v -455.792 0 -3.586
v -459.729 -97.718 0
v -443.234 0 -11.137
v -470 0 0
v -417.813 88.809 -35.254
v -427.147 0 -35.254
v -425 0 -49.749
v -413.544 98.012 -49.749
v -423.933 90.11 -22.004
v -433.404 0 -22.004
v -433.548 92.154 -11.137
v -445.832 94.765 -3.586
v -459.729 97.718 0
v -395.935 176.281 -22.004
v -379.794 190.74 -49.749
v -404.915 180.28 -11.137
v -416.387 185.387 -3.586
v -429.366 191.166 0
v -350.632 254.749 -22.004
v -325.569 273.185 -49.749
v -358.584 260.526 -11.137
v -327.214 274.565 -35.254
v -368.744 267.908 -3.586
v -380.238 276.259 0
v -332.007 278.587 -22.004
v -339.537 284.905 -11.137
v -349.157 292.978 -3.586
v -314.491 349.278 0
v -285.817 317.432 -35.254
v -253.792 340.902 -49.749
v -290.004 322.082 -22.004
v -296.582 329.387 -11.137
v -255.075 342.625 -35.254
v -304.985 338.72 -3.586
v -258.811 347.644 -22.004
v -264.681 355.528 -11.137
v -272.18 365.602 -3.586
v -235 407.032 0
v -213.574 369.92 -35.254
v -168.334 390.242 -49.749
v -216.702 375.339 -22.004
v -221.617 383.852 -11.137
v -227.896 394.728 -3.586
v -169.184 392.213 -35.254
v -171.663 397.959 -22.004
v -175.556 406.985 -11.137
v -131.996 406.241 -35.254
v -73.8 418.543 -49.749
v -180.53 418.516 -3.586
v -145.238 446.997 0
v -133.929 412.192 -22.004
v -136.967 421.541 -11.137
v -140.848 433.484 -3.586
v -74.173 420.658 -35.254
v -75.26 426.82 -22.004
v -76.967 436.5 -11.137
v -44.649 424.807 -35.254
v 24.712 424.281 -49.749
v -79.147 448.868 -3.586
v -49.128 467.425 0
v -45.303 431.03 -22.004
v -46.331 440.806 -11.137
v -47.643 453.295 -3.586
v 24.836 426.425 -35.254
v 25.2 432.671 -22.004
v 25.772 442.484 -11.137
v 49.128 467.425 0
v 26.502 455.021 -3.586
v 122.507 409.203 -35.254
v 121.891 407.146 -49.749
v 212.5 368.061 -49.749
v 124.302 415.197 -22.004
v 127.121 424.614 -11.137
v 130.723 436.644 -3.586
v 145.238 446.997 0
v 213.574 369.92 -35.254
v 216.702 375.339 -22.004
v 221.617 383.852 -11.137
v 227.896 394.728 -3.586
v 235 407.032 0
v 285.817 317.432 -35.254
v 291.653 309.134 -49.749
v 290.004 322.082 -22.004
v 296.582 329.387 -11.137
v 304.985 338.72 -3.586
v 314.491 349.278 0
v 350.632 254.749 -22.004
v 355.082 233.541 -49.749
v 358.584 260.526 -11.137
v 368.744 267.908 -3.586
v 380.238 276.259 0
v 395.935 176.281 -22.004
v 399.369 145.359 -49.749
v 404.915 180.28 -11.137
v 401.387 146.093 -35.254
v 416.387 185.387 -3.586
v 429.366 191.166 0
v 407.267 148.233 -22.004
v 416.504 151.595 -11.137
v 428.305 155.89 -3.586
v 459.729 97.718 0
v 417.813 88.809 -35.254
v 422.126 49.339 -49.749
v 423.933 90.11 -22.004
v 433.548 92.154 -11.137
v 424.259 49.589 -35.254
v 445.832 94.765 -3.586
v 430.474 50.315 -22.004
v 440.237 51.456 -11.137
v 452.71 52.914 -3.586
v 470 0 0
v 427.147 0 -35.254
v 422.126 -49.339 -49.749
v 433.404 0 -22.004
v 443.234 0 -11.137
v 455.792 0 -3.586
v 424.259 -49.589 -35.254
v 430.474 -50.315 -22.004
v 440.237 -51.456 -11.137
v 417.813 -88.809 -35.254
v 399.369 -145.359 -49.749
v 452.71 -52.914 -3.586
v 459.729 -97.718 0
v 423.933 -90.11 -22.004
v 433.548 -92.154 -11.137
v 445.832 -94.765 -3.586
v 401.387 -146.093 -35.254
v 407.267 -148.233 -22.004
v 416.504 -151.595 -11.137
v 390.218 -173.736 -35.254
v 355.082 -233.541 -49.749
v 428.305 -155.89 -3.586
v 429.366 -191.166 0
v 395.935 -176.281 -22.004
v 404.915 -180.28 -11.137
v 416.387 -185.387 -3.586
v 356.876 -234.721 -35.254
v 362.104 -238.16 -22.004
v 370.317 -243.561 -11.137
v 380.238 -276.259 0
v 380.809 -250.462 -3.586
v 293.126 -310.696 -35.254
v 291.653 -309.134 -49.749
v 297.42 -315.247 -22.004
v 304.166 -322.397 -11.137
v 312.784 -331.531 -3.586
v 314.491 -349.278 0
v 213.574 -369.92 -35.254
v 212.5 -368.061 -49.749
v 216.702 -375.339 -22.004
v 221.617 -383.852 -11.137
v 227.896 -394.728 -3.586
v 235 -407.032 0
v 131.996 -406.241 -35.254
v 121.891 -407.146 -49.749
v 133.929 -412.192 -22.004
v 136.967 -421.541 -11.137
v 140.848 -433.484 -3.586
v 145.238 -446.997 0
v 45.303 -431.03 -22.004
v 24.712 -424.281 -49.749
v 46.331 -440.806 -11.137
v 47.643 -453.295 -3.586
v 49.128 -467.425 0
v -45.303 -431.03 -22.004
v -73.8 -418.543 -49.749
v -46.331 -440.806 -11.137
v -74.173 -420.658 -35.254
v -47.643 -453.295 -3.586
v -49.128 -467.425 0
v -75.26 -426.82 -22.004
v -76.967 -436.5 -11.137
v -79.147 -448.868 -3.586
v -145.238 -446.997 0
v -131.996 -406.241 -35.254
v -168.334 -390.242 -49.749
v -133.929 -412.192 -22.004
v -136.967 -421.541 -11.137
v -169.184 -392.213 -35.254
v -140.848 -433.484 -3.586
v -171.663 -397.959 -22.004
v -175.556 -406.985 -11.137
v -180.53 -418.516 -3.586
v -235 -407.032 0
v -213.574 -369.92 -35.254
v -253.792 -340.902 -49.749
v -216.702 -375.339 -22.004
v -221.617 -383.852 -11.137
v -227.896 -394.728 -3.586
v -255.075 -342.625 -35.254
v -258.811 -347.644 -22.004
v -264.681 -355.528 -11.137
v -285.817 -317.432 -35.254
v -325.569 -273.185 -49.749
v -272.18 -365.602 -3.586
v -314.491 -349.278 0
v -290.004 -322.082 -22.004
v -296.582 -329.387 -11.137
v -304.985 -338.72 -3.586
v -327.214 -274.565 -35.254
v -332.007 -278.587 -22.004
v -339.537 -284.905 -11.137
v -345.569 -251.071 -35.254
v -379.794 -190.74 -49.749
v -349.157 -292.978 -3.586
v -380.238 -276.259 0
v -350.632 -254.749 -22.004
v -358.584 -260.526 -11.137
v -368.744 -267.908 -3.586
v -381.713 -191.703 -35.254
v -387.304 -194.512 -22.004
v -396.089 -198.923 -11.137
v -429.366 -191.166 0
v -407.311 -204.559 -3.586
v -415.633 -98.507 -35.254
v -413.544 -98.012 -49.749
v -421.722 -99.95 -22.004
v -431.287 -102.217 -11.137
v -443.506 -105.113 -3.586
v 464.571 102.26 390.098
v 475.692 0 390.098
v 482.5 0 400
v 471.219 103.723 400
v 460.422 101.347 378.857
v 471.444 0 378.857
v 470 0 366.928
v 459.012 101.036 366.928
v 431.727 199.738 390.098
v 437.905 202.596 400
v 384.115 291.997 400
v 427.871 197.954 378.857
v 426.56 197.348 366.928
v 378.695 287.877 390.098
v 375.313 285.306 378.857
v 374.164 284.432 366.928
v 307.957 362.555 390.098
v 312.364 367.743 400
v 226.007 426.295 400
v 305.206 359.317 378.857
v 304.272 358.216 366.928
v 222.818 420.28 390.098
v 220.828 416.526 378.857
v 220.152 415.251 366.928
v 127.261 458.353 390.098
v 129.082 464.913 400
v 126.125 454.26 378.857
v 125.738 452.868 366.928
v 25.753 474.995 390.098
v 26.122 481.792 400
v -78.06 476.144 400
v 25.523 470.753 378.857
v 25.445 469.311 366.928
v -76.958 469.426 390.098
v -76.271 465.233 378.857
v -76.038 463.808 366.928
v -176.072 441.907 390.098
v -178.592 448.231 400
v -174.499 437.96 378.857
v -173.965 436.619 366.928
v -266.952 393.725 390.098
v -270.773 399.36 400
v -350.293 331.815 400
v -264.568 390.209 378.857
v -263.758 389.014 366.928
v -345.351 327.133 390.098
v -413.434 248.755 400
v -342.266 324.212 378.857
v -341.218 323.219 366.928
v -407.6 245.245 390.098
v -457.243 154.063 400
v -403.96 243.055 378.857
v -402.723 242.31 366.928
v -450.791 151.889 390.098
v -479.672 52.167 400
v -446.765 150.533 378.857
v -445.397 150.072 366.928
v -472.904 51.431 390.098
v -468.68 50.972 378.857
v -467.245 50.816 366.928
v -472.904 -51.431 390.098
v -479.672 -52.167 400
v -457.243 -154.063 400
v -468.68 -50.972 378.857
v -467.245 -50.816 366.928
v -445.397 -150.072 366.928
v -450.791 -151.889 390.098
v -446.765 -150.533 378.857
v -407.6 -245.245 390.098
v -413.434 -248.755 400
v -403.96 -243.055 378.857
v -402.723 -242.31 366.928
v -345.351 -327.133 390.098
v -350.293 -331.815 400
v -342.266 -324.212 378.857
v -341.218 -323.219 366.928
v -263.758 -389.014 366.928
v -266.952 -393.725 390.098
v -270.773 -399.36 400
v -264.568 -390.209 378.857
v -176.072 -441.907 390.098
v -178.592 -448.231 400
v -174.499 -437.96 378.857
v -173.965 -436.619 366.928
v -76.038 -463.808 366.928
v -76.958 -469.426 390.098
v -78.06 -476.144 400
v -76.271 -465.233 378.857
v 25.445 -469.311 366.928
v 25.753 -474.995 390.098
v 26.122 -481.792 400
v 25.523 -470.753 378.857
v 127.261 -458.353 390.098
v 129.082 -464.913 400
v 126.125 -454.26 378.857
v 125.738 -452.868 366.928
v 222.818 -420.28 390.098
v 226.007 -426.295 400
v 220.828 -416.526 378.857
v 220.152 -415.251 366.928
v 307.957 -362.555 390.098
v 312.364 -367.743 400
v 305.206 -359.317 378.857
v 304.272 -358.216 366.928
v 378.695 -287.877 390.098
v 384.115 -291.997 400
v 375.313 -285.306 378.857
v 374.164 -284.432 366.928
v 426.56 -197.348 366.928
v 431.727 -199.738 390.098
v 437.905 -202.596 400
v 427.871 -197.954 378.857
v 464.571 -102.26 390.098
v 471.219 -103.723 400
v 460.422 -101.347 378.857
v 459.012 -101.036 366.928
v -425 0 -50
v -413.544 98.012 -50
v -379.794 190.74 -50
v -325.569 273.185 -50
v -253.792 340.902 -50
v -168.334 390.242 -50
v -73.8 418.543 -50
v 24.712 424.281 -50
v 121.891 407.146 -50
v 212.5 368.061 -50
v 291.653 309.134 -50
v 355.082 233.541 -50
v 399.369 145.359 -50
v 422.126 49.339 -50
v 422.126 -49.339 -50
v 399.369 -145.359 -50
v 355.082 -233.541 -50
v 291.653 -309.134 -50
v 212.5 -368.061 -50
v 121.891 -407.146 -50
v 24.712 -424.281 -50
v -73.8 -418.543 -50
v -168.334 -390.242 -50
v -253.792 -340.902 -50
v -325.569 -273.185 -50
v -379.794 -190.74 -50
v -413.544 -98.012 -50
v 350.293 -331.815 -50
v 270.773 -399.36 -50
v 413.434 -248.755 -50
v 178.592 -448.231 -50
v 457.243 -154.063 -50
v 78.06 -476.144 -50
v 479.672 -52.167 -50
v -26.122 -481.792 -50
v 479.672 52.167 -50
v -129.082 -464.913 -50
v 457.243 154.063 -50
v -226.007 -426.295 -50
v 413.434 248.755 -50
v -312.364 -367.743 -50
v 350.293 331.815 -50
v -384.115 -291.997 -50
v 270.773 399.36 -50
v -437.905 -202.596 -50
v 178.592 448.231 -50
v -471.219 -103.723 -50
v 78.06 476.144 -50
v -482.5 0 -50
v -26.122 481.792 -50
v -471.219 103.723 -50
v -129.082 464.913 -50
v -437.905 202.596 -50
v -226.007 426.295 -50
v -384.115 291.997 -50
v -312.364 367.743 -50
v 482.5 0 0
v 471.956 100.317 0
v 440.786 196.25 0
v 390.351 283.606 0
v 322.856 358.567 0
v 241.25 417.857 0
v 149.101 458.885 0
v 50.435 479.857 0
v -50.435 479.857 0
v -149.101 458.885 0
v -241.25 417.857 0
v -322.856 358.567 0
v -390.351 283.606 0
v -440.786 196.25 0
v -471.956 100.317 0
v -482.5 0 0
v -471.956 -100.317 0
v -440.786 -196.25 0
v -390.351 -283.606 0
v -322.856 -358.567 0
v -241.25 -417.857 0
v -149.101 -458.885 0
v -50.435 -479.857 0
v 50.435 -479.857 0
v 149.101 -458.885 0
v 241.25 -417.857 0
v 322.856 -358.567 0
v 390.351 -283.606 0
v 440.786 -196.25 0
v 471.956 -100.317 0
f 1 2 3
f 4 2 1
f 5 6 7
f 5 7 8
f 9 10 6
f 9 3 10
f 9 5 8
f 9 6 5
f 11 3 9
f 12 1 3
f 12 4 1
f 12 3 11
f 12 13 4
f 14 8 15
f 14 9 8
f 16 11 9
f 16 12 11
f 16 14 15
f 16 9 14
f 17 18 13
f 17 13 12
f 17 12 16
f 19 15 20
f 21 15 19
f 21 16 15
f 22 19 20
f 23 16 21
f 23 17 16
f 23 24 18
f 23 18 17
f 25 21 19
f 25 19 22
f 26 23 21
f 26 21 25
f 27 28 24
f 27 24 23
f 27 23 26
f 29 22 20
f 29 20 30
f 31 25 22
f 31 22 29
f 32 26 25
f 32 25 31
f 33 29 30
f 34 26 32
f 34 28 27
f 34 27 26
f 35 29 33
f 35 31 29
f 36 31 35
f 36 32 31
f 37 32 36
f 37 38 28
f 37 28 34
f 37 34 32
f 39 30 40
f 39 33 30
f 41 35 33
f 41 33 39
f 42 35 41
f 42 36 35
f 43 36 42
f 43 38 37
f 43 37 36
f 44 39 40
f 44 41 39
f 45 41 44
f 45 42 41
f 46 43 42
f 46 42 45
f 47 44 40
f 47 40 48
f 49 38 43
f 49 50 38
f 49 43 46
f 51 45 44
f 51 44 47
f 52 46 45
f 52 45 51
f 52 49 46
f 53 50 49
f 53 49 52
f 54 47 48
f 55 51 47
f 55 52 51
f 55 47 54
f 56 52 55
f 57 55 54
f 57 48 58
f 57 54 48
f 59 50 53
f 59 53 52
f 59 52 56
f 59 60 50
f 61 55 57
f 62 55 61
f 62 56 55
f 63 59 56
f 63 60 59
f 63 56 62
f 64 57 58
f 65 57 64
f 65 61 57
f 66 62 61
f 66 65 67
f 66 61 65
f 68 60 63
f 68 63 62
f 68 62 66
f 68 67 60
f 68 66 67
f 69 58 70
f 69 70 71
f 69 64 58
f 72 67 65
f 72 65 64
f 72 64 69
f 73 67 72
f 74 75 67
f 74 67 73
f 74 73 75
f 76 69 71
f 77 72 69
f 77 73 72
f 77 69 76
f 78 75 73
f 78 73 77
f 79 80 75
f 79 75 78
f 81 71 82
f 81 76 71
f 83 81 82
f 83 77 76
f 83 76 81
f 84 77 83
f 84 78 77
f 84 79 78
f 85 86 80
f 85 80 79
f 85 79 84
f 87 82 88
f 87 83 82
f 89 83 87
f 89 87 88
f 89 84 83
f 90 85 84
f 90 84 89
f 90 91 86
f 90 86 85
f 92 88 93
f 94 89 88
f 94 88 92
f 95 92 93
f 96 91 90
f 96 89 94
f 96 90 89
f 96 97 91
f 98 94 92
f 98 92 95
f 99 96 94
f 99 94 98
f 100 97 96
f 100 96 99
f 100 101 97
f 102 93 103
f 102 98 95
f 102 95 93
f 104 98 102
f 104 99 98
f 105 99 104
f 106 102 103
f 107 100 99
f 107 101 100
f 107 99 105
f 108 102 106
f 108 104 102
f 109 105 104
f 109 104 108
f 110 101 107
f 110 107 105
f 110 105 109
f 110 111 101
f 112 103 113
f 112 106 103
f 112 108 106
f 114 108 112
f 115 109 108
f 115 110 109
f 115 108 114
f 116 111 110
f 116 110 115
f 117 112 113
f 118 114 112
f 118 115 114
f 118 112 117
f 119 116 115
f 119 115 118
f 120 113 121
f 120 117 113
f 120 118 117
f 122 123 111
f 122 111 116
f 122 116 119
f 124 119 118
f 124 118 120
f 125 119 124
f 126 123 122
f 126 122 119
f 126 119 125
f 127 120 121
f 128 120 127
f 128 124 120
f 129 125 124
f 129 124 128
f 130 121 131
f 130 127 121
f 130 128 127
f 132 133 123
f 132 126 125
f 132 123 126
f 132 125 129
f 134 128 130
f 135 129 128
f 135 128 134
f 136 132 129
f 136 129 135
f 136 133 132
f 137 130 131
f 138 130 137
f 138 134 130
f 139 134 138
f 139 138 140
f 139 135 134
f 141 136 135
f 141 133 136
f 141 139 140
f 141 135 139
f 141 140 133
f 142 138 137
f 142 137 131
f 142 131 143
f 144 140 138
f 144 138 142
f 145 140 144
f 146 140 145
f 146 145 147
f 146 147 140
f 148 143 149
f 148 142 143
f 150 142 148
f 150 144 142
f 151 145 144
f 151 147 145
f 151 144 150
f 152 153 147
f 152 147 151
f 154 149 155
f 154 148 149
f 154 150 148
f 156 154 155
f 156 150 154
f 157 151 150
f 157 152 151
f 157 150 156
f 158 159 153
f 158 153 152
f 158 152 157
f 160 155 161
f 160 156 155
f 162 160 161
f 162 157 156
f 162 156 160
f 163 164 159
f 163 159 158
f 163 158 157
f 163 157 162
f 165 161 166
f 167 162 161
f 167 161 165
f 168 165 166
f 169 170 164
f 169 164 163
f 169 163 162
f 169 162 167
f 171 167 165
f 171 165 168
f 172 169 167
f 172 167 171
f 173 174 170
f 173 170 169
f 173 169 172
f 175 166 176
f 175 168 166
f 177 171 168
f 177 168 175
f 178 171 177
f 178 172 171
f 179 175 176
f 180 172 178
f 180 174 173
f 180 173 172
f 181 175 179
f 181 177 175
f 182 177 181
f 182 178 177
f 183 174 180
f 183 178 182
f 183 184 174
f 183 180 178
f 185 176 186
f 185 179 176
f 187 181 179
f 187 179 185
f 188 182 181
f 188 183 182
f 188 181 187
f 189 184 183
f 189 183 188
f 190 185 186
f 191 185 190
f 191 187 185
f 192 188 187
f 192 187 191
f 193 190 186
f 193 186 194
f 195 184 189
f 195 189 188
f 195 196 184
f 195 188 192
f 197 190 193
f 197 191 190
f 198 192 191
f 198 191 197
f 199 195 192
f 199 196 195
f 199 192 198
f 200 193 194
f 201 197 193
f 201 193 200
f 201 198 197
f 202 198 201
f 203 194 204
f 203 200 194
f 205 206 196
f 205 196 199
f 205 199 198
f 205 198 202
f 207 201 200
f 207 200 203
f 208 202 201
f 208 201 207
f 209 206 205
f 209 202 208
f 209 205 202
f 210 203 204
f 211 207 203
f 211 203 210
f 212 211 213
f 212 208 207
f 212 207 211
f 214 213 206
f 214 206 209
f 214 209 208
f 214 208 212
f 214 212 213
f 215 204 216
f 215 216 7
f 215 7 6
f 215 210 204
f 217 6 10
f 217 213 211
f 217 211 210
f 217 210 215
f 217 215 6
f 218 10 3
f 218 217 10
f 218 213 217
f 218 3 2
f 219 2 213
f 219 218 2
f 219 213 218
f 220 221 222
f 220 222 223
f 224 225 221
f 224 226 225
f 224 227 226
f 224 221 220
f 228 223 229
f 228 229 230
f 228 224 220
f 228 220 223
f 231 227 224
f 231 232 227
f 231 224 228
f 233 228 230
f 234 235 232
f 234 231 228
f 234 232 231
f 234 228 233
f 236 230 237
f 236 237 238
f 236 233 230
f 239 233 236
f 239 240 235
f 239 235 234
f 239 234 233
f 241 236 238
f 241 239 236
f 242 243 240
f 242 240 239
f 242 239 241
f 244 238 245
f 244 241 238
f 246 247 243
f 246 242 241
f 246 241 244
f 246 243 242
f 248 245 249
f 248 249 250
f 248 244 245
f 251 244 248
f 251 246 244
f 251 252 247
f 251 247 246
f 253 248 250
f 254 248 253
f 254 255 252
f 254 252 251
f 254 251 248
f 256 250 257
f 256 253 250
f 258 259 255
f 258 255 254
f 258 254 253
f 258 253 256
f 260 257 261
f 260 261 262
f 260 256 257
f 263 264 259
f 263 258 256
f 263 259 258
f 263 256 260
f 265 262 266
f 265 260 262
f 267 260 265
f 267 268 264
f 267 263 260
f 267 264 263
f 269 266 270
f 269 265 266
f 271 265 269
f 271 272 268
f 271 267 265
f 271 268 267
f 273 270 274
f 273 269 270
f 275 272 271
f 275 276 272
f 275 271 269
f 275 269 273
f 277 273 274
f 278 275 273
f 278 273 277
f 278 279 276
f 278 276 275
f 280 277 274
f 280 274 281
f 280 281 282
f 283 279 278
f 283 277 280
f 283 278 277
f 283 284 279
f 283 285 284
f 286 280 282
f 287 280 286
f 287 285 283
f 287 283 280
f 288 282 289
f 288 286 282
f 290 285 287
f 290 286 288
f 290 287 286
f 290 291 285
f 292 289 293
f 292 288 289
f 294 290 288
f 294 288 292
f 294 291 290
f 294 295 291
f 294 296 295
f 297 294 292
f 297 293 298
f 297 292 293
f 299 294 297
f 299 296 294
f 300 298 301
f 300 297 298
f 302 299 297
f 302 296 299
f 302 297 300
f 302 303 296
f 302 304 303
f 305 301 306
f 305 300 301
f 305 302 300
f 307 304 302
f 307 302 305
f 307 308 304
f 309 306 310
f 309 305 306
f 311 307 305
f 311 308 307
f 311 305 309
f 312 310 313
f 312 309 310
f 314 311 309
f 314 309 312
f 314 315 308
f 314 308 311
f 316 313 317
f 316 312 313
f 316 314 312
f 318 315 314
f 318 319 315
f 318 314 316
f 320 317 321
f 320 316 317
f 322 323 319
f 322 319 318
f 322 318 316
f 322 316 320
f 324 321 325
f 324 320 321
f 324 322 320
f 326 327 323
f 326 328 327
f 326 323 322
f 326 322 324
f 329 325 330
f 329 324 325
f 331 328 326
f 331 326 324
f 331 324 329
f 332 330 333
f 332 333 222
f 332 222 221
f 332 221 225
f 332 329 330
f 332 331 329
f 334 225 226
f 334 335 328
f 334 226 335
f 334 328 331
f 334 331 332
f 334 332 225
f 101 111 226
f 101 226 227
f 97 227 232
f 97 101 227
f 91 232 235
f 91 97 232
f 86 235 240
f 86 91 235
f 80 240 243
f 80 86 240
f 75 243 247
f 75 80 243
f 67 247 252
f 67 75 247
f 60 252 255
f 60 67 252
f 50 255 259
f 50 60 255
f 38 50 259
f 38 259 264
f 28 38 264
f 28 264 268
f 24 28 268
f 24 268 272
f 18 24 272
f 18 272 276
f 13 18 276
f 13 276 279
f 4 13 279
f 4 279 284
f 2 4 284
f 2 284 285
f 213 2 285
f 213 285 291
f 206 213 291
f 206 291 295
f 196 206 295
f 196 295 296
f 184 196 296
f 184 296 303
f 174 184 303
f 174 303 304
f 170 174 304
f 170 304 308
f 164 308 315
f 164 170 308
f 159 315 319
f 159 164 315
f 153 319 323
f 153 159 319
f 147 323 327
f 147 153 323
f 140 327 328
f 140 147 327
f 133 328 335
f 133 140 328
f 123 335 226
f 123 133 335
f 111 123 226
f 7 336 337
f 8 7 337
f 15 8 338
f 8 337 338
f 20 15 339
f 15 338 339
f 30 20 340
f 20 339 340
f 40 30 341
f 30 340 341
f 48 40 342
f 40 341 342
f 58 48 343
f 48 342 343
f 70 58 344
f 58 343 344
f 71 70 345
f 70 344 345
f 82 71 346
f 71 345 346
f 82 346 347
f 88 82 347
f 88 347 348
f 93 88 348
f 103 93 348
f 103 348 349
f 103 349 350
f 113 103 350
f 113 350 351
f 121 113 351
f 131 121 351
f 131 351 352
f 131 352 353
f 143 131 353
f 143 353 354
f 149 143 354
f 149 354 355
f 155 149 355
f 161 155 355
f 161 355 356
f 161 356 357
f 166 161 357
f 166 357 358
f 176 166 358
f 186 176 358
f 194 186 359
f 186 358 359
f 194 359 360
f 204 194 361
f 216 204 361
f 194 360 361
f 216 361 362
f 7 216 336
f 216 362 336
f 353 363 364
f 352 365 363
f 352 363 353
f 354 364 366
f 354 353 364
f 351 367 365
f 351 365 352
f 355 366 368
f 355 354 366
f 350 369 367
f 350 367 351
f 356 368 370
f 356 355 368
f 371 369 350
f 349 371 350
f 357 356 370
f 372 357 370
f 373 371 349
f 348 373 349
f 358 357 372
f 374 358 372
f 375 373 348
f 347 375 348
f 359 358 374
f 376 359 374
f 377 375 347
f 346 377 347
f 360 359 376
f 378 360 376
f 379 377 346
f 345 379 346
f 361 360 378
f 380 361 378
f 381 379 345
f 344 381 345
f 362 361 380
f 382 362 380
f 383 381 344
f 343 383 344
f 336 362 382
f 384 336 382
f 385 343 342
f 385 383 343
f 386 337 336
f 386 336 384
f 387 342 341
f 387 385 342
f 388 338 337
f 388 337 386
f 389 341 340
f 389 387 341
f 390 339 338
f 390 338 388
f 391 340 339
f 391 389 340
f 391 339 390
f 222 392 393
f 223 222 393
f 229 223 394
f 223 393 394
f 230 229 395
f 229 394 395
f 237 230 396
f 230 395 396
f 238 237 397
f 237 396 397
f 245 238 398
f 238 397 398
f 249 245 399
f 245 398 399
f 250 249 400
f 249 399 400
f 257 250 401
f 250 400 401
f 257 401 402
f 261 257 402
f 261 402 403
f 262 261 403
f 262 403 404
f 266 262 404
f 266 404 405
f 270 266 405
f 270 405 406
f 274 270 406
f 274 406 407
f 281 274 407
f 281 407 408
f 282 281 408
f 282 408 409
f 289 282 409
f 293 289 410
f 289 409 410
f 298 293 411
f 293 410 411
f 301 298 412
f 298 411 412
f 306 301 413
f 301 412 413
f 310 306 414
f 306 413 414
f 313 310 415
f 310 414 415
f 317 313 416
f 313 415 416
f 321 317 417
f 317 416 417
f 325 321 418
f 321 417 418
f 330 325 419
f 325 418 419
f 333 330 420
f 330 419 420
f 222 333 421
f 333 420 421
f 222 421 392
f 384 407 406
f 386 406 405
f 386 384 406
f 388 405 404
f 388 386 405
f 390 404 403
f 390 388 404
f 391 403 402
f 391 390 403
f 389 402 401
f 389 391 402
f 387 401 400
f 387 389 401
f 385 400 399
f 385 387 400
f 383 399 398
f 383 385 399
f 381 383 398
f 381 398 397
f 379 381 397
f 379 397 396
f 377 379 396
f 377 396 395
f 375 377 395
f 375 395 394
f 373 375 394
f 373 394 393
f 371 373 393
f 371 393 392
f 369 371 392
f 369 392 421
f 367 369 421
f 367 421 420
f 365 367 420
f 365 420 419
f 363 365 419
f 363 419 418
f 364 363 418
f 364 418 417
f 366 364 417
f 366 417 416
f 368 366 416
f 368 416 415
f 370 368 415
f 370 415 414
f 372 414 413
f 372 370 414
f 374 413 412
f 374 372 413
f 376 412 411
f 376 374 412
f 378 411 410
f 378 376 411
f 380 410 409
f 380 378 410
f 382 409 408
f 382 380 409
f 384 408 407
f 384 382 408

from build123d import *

# Parameters (mm, degrees)
CROQUIS1_R              = 482.5
CROQUIS1_R_2            = 470
SALIENTE_EXTRUIR1_DEPTH = 400
REDONDEO1_R             = 50
SALIENTE_EXTRUIR2_START = 50
CROQUIS2_R              = 482.5
CROQUIS2_R_2            = 425
SALIENTE_EXTRUIR2_DEPTH = 50
REDONDEO3_R             = 50


with BuildPart() as part:
    # Croquis1 → Saliente-Extruir1 (new body)
    with BuildSketch(Plane(origin=(0, 0, 0), x_dir=(0, 1, 0), z_dir=(0, 0, 1))):
        with Locations(Location((0, 0, 0), (0, 0, 270))):
            Circle(CROQUIS1_R)
        with Locations(Location((0, 0, 0), (0, 0, 270))):
            Circle(CROQUIS1_R_2, mode=Mode.SUBTRACT)
    extrude(amount=SALIENTE_EXTRUIR1_DEPTH)

    # Redondeo1
    # the kernel refuses this fillet: 50 mm, written as the material it takes off along each edge
    with BuildSketch(Plane(origin=(0, 0, 400), x_dir=(1, 0, 0), z_dir=(0, -1, 0))) as redondeo1_piece_1:
        with BuildLine():
            CenterArc((520, -33.071891388), REDONDEO1_R, 138.590377891, 41.409622109)
            Line((482.5, 0), (481.75, 0.661437828))
            ThreePointArc((481.75, 0.661437828), (476.25, 1), (470, 1))
            Line((470, 1), (469, 0))
            Line((469, 0), (469, -33.071891388))
            Line((469, -33.071891388), (470, -33.071891388))
        make_face()
    revolve(axis=Axis((0, 0, 400), (0, 0, 1)), mode=Mode.SUBTRACT)

    # Croquis2 → Saliente-Extruir2 (add)
    with BuildSketch(Plane(origin=(0, 0, 0), x_dir=(1, 0, 0), z_dir=(0, 0, -1)).offset(SALIENTE_EXTRUIR2_START)):
        with Locations(Location((0, 0, 0), (0, 0, 180))):
            Circle(CROQUIS2_R)
        with Locations(Location((0, 0, 0), (0, 0, 180))):
            Circle(CROQUIS2_R_2, mode=Mode.SUBTRACT)
    extrude(amount=-SALIENTE_EXTRUIR2_DEPTH)

    # Redondeo3
    # the kernel refuses this fillet: 50 mm, written as the material it takes off along each edge
    with BuildSketch(Plane(origin=(0, 0, 0), x_dir=(-1, 0, 0), z_dir=(0, -1, 0))) as redondeo3_piece_1:
        with BuildLine():
            CenterArc((475, 49.749371855), REDONDEO3_R, 180, 84.260829523)
            Line((470, 0), (469.9, -0.994987437))
            ThreePointArc((469.9, -0.994987437), (447.5, -1), (425, -1))
            Line((425, -1), (424, 0))
            Line((424, 0), (424, 49.749371855))
            Line((424, 49.749371855), (425, 49.749371855))
        make_face()
    revolve(axis=Axis((0, 0, 0), (0, 0, -1)), mode=Mode.SUBTRACT)


solid = part.part
